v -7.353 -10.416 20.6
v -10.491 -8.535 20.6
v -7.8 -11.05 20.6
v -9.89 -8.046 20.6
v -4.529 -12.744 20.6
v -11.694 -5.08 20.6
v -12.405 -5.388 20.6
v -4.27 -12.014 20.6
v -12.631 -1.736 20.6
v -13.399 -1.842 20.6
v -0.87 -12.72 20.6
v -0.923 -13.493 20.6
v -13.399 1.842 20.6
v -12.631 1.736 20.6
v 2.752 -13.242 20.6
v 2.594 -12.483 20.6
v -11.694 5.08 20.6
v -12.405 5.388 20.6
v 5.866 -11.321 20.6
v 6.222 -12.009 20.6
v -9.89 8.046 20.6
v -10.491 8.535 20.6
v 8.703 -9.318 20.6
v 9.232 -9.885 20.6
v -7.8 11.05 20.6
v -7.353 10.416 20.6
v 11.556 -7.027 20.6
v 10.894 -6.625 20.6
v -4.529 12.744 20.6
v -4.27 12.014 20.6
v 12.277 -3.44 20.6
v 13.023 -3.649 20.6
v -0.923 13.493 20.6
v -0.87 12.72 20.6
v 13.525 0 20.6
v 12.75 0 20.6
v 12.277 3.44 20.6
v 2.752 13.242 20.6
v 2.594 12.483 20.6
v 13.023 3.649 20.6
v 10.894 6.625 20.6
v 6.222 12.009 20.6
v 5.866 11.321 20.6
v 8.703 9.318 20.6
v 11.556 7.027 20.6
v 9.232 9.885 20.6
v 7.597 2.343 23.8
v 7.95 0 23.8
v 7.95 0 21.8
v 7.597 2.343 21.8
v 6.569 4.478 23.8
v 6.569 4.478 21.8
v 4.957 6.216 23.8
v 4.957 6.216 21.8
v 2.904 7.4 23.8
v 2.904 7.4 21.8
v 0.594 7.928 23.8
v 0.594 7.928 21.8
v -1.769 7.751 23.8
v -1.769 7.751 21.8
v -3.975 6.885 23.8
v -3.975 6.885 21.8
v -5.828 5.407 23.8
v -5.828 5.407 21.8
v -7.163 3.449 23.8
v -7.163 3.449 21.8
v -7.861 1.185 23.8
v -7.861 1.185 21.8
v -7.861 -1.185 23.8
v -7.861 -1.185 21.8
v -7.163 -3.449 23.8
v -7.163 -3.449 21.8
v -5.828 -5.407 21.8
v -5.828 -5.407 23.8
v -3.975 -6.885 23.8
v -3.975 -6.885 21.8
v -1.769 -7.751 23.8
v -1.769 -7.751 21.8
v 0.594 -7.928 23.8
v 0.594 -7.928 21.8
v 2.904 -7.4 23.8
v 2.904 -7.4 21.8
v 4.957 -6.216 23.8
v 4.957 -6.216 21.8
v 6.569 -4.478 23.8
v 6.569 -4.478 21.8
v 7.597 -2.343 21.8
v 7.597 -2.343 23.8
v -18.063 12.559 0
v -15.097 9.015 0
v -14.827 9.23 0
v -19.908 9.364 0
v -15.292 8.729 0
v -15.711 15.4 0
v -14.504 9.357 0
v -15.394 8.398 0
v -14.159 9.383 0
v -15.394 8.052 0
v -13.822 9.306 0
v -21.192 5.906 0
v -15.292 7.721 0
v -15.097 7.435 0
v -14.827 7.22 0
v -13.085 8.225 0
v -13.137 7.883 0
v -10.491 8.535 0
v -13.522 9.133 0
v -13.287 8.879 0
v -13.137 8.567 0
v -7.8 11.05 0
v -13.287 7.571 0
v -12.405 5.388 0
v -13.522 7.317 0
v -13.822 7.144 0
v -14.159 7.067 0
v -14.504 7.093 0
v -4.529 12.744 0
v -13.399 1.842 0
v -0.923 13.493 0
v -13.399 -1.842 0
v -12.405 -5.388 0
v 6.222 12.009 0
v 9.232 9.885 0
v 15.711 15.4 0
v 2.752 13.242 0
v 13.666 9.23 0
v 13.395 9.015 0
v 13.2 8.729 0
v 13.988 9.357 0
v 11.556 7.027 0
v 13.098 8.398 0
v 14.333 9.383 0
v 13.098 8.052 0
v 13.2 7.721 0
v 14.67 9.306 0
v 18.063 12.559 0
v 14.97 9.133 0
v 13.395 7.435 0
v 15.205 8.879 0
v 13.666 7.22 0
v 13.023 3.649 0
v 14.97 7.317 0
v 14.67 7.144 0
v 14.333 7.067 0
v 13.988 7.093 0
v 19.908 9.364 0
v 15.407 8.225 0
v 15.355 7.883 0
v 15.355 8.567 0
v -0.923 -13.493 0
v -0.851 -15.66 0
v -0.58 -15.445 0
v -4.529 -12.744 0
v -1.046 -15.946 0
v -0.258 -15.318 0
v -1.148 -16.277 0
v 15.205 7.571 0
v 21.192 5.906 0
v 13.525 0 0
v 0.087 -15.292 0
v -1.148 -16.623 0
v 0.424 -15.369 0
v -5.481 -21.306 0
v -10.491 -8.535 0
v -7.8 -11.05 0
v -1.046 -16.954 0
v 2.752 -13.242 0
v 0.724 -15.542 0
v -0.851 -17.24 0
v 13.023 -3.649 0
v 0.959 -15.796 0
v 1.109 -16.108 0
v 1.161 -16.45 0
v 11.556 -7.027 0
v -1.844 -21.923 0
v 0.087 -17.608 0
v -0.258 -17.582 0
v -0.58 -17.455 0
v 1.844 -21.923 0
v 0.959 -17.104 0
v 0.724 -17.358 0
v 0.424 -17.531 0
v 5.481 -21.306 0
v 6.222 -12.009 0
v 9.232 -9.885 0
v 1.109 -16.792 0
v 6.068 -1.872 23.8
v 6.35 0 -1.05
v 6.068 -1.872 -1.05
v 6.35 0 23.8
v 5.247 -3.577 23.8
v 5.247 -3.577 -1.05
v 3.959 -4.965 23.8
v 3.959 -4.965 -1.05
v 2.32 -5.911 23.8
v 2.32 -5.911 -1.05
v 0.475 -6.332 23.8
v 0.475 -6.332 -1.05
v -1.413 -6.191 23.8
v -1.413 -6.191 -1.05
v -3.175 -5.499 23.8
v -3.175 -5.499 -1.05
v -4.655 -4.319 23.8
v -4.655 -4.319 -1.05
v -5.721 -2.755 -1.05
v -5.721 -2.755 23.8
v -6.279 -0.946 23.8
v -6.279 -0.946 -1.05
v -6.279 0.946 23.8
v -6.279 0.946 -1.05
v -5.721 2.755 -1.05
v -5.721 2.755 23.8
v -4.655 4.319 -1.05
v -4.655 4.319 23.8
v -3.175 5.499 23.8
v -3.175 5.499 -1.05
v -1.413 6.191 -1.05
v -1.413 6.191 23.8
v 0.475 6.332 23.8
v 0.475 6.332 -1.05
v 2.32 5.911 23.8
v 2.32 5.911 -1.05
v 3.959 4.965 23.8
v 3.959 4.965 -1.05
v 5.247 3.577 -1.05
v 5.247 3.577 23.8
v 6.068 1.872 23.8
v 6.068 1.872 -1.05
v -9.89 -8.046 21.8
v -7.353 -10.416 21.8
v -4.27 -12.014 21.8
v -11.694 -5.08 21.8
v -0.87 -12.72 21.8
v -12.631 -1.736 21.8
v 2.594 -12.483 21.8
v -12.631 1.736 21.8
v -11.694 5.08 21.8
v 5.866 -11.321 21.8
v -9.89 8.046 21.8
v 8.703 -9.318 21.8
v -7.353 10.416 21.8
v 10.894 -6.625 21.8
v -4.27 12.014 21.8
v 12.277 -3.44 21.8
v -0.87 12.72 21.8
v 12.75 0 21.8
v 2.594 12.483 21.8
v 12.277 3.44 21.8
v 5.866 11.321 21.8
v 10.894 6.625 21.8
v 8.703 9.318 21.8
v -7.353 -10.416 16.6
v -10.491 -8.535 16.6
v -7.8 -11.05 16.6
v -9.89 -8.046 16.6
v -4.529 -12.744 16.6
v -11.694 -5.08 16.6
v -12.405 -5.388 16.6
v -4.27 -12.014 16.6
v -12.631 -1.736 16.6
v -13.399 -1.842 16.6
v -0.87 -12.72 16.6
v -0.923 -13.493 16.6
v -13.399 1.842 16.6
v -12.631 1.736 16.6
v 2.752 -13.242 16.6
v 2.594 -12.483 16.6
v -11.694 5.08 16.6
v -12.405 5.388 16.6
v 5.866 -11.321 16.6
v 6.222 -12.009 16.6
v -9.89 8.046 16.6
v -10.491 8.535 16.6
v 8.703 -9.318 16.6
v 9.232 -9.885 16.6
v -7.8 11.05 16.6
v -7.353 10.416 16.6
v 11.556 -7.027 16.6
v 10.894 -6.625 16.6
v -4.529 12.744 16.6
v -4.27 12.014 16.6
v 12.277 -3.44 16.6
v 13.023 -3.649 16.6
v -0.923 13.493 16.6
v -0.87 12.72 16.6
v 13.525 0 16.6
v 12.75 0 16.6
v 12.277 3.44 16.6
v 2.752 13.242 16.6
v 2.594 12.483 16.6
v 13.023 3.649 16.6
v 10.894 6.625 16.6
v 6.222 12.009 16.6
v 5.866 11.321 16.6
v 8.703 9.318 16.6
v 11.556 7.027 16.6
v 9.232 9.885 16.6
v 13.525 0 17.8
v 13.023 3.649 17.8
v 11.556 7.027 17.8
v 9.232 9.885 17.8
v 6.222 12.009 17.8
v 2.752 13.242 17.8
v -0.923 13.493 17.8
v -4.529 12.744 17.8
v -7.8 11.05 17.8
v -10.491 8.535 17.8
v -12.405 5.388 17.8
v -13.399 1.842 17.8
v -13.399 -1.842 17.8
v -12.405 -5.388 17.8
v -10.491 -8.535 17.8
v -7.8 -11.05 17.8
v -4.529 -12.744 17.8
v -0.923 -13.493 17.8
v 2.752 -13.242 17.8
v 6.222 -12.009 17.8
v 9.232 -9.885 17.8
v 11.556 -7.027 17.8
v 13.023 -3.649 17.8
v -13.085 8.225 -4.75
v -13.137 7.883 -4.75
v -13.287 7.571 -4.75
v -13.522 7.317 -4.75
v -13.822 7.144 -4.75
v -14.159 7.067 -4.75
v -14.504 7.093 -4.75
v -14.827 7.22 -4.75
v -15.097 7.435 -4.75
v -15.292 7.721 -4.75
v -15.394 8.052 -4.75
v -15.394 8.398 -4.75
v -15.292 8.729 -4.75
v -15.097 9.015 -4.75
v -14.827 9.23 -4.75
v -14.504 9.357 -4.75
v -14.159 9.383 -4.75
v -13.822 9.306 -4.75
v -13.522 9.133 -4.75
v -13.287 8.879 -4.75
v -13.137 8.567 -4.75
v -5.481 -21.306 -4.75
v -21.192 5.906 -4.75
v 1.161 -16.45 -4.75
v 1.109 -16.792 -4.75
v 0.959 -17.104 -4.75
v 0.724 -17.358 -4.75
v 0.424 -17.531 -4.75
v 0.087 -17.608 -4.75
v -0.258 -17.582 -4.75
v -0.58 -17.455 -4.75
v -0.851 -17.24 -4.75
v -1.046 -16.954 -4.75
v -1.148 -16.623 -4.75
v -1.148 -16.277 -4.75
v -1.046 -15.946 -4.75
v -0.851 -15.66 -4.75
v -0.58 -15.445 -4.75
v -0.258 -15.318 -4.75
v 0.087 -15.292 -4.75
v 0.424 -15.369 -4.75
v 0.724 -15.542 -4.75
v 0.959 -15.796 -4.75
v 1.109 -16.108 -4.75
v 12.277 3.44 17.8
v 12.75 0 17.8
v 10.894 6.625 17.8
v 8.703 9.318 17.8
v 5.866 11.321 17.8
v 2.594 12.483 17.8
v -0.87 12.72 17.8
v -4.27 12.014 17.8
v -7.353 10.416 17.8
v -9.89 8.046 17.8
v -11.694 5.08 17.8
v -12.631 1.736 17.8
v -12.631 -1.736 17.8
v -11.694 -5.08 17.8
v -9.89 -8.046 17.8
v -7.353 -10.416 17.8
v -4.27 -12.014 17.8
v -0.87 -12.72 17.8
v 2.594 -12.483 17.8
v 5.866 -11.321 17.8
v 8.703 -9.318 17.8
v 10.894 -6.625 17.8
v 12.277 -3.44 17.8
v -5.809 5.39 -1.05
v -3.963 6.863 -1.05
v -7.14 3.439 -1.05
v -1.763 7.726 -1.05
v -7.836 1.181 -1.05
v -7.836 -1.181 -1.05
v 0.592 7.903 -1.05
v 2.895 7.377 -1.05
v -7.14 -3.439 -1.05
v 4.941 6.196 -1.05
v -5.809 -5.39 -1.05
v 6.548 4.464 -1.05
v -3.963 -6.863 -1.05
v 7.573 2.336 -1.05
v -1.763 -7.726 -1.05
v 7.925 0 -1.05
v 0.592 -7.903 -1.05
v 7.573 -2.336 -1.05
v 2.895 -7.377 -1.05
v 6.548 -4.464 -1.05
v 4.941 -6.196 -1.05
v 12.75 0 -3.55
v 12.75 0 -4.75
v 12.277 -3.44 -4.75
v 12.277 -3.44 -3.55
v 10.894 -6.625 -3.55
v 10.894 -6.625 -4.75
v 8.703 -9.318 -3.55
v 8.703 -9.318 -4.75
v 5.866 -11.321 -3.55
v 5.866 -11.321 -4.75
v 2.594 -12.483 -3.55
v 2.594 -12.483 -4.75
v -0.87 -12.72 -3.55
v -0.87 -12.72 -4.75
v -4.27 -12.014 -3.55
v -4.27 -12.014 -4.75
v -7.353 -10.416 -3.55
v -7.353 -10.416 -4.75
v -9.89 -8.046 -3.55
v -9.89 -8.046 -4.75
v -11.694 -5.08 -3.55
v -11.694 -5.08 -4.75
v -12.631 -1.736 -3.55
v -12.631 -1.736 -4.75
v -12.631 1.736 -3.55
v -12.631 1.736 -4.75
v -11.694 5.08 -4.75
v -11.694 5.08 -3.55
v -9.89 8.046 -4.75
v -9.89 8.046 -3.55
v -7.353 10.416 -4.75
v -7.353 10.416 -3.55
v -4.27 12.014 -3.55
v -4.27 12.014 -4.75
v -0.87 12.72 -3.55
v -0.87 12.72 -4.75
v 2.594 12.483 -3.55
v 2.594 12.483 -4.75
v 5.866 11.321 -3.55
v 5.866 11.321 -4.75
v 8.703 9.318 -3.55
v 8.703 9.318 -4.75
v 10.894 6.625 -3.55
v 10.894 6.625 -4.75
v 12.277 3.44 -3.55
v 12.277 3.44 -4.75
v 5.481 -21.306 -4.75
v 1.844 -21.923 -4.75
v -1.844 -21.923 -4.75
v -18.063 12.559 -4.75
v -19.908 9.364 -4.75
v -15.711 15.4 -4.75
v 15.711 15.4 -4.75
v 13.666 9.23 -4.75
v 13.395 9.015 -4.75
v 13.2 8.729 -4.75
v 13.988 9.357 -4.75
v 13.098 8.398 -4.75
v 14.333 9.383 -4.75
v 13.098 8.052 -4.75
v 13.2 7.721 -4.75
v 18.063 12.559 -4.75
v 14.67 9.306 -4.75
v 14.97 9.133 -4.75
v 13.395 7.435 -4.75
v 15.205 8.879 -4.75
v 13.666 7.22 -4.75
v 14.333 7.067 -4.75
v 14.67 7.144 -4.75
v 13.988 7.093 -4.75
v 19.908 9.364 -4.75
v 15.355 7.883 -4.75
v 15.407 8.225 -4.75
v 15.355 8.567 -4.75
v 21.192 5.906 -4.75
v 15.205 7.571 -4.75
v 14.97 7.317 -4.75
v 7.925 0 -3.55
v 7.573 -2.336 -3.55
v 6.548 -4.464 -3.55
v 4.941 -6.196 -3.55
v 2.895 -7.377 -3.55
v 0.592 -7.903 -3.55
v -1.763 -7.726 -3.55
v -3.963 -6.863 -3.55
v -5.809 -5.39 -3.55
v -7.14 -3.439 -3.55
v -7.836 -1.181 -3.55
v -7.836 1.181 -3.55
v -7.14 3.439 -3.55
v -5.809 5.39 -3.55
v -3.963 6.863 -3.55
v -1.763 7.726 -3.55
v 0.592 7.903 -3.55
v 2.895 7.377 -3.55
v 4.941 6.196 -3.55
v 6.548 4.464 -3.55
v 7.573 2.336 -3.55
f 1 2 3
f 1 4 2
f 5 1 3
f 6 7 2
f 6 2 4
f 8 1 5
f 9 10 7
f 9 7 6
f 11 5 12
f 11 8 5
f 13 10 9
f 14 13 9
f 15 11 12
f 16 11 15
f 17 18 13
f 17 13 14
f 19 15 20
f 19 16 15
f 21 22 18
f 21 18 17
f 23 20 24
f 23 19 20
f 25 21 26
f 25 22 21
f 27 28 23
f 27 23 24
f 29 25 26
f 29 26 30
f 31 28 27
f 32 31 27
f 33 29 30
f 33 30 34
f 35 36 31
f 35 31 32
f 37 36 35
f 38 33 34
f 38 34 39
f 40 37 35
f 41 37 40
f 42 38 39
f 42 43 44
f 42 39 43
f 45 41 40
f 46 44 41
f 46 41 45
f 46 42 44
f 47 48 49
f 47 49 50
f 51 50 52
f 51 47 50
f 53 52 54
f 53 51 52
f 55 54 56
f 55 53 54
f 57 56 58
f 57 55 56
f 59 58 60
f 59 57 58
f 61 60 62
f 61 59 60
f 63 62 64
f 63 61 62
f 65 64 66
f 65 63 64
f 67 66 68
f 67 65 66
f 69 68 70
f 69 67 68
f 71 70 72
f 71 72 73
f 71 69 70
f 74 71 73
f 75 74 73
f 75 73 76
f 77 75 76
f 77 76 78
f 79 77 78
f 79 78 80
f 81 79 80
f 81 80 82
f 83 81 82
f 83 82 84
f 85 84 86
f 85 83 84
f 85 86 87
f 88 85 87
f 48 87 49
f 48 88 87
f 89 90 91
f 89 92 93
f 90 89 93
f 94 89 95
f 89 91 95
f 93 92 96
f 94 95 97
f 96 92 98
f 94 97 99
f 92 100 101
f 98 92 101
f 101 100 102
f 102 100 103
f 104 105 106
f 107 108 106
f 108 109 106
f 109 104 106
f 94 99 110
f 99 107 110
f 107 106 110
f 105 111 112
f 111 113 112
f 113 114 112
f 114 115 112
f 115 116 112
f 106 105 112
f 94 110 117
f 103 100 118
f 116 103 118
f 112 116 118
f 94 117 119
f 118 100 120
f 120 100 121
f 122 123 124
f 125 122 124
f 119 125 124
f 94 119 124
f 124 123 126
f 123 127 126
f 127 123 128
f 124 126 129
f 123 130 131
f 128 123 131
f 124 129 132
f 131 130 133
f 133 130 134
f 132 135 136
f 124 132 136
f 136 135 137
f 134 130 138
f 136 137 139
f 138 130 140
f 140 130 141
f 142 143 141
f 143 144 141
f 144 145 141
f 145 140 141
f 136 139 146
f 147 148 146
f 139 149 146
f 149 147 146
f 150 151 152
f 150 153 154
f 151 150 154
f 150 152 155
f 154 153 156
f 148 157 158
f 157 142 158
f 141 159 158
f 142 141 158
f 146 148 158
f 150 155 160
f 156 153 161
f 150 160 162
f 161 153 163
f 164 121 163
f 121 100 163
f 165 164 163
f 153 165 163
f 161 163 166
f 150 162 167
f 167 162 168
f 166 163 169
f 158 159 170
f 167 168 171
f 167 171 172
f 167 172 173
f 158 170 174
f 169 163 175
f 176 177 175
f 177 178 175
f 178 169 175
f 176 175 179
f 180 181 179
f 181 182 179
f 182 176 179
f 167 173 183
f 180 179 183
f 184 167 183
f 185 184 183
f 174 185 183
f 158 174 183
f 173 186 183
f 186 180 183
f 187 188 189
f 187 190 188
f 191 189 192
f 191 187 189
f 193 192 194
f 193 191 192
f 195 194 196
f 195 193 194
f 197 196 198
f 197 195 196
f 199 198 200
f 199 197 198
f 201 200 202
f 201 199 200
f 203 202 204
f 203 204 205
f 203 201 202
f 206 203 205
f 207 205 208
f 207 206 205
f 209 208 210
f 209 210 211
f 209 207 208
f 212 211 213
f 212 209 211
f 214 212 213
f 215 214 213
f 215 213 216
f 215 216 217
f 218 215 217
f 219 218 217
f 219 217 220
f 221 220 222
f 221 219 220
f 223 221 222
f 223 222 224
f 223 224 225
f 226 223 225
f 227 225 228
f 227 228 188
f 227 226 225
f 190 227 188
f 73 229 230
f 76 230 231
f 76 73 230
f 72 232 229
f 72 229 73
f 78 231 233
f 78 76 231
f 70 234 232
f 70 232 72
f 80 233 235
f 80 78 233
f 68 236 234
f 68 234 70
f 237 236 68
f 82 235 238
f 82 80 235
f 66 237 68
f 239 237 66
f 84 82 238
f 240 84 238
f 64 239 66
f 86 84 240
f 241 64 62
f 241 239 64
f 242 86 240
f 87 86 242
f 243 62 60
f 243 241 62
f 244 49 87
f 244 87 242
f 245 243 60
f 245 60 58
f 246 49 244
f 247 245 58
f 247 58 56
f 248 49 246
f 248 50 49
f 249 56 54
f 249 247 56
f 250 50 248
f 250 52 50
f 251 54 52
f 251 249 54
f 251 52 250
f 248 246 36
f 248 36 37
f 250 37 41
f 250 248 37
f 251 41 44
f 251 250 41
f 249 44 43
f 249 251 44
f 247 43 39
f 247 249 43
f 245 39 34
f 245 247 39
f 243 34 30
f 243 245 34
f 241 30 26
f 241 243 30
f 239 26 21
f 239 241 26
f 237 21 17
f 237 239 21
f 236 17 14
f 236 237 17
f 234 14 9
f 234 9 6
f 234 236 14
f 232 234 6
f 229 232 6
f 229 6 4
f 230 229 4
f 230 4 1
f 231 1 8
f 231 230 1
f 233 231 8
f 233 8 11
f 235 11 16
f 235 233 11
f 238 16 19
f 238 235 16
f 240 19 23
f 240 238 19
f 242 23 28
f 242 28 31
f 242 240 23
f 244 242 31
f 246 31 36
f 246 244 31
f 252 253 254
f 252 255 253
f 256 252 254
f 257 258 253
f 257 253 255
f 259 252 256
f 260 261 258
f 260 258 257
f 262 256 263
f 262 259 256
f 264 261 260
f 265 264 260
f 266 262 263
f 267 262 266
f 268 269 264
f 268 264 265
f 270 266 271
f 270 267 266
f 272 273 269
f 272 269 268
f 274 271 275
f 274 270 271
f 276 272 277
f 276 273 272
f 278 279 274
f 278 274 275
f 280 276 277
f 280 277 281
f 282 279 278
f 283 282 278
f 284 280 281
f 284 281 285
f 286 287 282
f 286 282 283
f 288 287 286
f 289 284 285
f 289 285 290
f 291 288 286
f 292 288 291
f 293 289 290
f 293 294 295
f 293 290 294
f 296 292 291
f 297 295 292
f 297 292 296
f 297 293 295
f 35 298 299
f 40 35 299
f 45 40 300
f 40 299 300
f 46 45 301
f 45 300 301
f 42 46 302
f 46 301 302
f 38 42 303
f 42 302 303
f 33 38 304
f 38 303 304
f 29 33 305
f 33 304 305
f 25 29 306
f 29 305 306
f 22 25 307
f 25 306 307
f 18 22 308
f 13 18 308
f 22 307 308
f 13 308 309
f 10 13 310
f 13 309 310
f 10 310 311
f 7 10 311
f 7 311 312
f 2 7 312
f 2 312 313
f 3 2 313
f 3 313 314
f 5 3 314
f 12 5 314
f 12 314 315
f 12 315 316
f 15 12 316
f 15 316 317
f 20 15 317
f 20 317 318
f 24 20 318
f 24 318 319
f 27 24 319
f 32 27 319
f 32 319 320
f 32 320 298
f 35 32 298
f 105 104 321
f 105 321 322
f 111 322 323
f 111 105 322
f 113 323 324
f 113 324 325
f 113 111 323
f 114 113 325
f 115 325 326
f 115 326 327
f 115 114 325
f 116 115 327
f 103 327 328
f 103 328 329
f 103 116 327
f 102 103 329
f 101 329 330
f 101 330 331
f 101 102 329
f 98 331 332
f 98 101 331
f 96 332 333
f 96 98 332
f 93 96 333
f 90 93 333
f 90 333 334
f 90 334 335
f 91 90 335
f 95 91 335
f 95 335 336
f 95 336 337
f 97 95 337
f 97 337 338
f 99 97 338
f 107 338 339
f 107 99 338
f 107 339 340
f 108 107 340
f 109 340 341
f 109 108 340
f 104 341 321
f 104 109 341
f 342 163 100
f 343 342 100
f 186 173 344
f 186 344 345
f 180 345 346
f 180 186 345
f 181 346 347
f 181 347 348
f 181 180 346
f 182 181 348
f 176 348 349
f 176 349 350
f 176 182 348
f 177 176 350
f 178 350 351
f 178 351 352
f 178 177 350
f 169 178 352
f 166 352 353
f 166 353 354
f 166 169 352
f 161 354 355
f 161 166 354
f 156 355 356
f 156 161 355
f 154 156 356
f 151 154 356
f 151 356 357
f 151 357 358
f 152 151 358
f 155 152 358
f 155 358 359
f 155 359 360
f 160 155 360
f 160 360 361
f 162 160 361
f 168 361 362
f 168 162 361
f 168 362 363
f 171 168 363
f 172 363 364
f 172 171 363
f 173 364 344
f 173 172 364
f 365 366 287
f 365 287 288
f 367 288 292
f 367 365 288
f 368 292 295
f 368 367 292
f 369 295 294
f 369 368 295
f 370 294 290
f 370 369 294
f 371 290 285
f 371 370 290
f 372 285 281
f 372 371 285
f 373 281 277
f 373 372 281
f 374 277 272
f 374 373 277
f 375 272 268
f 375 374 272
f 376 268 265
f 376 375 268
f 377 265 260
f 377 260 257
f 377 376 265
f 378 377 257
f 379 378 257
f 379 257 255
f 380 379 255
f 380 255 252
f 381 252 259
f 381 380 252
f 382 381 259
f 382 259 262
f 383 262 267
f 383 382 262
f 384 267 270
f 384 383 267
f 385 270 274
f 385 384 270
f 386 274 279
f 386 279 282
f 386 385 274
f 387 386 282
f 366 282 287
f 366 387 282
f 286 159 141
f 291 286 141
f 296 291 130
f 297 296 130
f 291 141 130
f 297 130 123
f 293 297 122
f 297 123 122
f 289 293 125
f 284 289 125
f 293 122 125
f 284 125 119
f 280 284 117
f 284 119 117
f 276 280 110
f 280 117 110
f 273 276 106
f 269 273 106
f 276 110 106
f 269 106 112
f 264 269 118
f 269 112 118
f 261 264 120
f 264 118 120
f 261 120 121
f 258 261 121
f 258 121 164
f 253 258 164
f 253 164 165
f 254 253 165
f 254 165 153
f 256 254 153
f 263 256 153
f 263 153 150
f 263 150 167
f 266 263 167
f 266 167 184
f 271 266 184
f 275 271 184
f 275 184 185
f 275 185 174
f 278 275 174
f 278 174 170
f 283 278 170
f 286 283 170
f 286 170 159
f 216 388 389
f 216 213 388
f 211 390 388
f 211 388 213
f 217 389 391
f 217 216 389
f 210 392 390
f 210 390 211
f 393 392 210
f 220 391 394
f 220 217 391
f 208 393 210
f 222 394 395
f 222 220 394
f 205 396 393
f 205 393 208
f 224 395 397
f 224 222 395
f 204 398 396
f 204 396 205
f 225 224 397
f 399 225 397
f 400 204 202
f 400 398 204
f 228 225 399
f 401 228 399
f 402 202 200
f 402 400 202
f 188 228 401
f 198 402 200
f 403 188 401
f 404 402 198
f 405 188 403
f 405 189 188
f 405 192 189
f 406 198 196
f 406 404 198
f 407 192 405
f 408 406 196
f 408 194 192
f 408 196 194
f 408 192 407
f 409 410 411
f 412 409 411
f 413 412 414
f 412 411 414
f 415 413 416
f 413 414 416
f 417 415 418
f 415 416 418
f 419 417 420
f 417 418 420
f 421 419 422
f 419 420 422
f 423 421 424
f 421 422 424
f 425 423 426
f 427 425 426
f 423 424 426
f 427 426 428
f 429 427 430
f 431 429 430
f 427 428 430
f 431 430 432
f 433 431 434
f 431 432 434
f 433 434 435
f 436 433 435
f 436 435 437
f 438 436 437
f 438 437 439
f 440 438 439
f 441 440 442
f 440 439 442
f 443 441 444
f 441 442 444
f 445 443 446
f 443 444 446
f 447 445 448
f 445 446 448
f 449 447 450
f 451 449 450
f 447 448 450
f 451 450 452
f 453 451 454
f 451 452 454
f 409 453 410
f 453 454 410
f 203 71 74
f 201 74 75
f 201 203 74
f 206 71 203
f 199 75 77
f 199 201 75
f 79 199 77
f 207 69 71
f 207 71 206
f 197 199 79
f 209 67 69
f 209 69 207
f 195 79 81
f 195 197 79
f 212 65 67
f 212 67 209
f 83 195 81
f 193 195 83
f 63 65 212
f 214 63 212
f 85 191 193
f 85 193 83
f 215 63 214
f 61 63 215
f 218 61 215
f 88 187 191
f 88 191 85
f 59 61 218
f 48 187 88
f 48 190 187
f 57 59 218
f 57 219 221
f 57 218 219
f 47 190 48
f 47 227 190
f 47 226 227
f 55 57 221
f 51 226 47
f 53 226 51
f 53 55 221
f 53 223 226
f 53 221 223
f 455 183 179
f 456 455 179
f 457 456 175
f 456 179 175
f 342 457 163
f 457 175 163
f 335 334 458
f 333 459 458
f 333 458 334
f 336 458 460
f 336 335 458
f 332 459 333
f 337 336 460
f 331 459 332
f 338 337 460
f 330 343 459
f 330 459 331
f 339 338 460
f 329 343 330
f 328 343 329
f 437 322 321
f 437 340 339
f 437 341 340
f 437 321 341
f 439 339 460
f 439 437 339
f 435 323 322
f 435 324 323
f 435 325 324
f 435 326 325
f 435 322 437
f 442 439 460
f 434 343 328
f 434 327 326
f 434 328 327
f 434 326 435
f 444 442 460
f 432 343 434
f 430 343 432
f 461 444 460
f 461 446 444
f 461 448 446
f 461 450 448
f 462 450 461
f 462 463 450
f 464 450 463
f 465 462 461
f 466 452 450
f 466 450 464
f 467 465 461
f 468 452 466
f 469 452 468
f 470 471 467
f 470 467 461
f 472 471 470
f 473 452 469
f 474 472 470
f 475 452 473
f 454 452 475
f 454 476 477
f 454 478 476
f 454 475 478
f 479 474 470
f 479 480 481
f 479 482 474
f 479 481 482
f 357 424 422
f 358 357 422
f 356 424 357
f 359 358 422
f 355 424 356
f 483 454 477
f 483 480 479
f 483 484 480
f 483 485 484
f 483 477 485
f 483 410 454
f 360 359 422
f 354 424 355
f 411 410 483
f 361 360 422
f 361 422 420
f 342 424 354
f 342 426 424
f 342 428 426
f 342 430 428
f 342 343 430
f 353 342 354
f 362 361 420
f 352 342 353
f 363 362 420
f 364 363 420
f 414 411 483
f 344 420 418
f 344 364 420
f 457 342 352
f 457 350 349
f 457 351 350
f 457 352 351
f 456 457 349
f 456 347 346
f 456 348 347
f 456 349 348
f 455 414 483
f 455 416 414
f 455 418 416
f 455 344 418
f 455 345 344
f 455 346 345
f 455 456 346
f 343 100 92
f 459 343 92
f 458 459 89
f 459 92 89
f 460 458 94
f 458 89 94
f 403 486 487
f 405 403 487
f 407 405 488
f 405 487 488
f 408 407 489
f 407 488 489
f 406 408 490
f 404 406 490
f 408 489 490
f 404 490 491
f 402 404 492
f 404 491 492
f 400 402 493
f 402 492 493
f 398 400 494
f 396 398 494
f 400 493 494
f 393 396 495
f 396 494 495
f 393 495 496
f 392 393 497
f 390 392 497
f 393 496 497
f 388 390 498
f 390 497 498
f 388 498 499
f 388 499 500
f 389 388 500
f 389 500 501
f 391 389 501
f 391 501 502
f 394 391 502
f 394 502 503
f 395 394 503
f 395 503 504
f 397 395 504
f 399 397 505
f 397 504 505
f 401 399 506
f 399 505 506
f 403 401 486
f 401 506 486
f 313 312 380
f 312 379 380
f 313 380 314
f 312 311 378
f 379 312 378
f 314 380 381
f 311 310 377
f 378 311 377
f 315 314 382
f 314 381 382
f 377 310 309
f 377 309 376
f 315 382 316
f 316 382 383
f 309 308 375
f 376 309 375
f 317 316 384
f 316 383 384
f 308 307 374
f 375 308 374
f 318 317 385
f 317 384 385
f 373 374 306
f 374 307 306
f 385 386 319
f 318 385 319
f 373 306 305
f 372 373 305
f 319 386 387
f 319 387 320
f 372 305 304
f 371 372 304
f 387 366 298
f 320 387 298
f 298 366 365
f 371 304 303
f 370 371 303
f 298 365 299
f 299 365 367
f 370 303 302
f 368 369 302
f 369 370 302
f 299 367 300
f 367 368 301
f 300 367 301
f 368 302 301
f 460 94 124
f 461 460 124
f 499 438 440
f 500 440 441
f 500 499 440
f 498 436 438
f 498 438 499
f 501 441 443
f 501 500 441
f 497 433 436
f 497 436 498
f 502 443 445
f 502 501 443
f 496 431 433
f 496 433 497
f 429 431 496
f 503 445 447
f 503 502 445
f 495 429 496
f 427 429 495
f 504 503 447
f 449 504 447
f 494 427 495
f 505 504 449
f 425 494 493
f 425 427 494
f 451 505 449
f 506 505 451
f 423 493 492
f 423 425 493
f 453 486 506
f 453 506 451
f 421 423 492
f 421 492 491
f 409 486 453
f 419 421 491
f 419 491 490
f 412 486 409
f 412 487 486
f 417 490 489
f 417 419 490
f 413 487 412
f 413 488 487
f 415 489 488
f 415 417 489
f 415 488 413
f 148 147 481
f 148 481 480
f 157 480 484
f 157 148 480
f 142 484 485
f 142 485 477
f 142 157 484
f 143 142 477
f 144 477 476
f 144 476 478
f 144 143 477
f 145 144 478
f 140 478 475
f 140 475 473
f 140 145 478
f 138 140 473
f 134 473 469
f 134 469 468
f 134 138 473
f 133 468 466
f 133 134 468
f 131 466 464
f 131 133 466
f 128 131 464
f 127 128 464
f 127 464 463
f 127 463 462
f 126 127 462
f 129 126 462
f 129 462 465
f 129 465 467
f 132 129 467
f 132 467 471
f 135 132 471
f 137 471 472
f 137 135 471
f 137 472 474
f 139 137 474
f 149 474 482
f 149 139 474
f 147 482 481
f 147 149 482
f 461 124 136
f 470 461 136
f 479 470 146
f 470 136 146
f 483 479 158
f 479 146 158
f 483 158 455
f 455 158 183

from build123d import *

# Parameters (mm, degrees)
F0_R      = 13.525
F0_R_2    = 6.35
F1_DEPTH  = 23.8
F2_R      = 13.525
F2_R_2    = 7.95
F3_DEPTH  = 2
F4_R      = 13.525
F4_R_2    = 12.75
F5_DEPTH  = 1.2
F6_R      = 1.1608870099
F6_R_2    = 13.525
F6_R_3    = 6.35
F7_DEPTH  = 4.75
F8_R      = 12.75
F8_R_2    = 6.35
F9_DEPTH  = 1.2
F10_R     = 7.925
F10_R_2   = 6.35
F11_DEPTH = 2.5
F13_R     = 13.525
F13_R_2   = 12.75
F14_DEPTH = 1.2


with BuildPart() as f1:
    # F0 (on Top) → F1 (new body)
    with BuildSketch(Plane.XY):
        Circle(F0_R)
        Circle(F0_R_2, mode=Mode.SUBTRACT)
    extrude(amount=F1_DEPTH)

    # F2 (on face) → F3 (cut)
    with BuildSketch(Plane.XY.offset(23.8)):
        Circle(F2_R)
        Circle(F2_R_2, mode=Mode.SUBTRACT)
    extrude(amount=-F3_DEPTH, mode=Mode.SUBTRACT)

    # F4 (on face) → F5 (cut)
    with BuildSketch(Plane.XY.offset(21.8)):
        Circle(F4_R)
        Circle(F4_R_2, mode=Mode.SUBTRACT)
    extrude(amount=-F5_DEPTH, mode=Mode.SUBTRACT)

    # F6 (on face) → F7 (join)
    with BuildSketch(Plane(origin=(0, 0, 0), x_dir=(1, 0, 0), z_dir=(0, 0, -1))):
        with BuildLine():
            Line((21.1923624897, -5.9062485645), (5.4812199469, 21.3062485645))
            ThreePointArc((5.4812199469, 21.3062485645), (0, 22), (-5.4812199469, 21.3062485645))
            Line((-5.4812199469, 21.3062485645), (-21.1923624897, -5.9062485645))
            ThreePointArc((-21.1923624897, -5.9062485645), (-19.0525588833, -11), (-15.7111425428, -15.4))
            Line((-15.7111425428, -15.4), (15.7111425428, -15.4))
            ThreePointArc((15.7111425428, -15.4), (19.0525588833, -11), (21.1923624897, -5.9062485645))
        make_face()
        with Locations((-14.2461178923, -8.225)):
            Circle(F6_R, mode=Mode.SUBTRACT)
        with Locations((14.2461178923, -8.225)):
            Circle(F6_R, mode=Mode.SUBTRACT)
        Circle(F6_R_2, mode=Mode.SUBTRACT)
        with Locations((0, 16.45)):
            Circle(F6_R, mode=Mode.SUBTRACT)
        Circle(F6_R_2)
        Circle(F6_R_3, mode=Mode.SUBTRACT)
    extrude(amount=F7_DEPTH)

    # F8 (on face) → F9 (cut)
    with BuildSketch(Plane(origin=(0, 0, -4.75), x_dir=(1, 0, 0), z_dir=(0, 0, -1))):
        Circle(F8_R)
        Circle(F8_R_2, mode=Mode.SUBTRACT)
    extrude(amount=-F9_DEPTH, mode=Mode.SUBTRACT)

    # F10 (on face) → F11 (cut)
    with BuildSketch(Plane(origin=(0, 0, -3.55), x_dir=(1, 0, 0), z_dir=(0, 0, -1))):
        Circle(F10_R)
        Circle(F10_R_2, mode=Mode.SUBTRACT)
    extrude(amount=-F11_DEPTH, mode=Mode.SUBTRACT)

    # F13 (on offset) → F14 (cut)
    with BuildSketch(Plane.XY.offset(17.8)):
        Circle(F13_R)
        Circle(F13_R_2, mode=Mode.SUBTRACT)
    extrude(amount=-F14_DEPTH, mode=Mode.SUBTRACT)


solid = f1.part
